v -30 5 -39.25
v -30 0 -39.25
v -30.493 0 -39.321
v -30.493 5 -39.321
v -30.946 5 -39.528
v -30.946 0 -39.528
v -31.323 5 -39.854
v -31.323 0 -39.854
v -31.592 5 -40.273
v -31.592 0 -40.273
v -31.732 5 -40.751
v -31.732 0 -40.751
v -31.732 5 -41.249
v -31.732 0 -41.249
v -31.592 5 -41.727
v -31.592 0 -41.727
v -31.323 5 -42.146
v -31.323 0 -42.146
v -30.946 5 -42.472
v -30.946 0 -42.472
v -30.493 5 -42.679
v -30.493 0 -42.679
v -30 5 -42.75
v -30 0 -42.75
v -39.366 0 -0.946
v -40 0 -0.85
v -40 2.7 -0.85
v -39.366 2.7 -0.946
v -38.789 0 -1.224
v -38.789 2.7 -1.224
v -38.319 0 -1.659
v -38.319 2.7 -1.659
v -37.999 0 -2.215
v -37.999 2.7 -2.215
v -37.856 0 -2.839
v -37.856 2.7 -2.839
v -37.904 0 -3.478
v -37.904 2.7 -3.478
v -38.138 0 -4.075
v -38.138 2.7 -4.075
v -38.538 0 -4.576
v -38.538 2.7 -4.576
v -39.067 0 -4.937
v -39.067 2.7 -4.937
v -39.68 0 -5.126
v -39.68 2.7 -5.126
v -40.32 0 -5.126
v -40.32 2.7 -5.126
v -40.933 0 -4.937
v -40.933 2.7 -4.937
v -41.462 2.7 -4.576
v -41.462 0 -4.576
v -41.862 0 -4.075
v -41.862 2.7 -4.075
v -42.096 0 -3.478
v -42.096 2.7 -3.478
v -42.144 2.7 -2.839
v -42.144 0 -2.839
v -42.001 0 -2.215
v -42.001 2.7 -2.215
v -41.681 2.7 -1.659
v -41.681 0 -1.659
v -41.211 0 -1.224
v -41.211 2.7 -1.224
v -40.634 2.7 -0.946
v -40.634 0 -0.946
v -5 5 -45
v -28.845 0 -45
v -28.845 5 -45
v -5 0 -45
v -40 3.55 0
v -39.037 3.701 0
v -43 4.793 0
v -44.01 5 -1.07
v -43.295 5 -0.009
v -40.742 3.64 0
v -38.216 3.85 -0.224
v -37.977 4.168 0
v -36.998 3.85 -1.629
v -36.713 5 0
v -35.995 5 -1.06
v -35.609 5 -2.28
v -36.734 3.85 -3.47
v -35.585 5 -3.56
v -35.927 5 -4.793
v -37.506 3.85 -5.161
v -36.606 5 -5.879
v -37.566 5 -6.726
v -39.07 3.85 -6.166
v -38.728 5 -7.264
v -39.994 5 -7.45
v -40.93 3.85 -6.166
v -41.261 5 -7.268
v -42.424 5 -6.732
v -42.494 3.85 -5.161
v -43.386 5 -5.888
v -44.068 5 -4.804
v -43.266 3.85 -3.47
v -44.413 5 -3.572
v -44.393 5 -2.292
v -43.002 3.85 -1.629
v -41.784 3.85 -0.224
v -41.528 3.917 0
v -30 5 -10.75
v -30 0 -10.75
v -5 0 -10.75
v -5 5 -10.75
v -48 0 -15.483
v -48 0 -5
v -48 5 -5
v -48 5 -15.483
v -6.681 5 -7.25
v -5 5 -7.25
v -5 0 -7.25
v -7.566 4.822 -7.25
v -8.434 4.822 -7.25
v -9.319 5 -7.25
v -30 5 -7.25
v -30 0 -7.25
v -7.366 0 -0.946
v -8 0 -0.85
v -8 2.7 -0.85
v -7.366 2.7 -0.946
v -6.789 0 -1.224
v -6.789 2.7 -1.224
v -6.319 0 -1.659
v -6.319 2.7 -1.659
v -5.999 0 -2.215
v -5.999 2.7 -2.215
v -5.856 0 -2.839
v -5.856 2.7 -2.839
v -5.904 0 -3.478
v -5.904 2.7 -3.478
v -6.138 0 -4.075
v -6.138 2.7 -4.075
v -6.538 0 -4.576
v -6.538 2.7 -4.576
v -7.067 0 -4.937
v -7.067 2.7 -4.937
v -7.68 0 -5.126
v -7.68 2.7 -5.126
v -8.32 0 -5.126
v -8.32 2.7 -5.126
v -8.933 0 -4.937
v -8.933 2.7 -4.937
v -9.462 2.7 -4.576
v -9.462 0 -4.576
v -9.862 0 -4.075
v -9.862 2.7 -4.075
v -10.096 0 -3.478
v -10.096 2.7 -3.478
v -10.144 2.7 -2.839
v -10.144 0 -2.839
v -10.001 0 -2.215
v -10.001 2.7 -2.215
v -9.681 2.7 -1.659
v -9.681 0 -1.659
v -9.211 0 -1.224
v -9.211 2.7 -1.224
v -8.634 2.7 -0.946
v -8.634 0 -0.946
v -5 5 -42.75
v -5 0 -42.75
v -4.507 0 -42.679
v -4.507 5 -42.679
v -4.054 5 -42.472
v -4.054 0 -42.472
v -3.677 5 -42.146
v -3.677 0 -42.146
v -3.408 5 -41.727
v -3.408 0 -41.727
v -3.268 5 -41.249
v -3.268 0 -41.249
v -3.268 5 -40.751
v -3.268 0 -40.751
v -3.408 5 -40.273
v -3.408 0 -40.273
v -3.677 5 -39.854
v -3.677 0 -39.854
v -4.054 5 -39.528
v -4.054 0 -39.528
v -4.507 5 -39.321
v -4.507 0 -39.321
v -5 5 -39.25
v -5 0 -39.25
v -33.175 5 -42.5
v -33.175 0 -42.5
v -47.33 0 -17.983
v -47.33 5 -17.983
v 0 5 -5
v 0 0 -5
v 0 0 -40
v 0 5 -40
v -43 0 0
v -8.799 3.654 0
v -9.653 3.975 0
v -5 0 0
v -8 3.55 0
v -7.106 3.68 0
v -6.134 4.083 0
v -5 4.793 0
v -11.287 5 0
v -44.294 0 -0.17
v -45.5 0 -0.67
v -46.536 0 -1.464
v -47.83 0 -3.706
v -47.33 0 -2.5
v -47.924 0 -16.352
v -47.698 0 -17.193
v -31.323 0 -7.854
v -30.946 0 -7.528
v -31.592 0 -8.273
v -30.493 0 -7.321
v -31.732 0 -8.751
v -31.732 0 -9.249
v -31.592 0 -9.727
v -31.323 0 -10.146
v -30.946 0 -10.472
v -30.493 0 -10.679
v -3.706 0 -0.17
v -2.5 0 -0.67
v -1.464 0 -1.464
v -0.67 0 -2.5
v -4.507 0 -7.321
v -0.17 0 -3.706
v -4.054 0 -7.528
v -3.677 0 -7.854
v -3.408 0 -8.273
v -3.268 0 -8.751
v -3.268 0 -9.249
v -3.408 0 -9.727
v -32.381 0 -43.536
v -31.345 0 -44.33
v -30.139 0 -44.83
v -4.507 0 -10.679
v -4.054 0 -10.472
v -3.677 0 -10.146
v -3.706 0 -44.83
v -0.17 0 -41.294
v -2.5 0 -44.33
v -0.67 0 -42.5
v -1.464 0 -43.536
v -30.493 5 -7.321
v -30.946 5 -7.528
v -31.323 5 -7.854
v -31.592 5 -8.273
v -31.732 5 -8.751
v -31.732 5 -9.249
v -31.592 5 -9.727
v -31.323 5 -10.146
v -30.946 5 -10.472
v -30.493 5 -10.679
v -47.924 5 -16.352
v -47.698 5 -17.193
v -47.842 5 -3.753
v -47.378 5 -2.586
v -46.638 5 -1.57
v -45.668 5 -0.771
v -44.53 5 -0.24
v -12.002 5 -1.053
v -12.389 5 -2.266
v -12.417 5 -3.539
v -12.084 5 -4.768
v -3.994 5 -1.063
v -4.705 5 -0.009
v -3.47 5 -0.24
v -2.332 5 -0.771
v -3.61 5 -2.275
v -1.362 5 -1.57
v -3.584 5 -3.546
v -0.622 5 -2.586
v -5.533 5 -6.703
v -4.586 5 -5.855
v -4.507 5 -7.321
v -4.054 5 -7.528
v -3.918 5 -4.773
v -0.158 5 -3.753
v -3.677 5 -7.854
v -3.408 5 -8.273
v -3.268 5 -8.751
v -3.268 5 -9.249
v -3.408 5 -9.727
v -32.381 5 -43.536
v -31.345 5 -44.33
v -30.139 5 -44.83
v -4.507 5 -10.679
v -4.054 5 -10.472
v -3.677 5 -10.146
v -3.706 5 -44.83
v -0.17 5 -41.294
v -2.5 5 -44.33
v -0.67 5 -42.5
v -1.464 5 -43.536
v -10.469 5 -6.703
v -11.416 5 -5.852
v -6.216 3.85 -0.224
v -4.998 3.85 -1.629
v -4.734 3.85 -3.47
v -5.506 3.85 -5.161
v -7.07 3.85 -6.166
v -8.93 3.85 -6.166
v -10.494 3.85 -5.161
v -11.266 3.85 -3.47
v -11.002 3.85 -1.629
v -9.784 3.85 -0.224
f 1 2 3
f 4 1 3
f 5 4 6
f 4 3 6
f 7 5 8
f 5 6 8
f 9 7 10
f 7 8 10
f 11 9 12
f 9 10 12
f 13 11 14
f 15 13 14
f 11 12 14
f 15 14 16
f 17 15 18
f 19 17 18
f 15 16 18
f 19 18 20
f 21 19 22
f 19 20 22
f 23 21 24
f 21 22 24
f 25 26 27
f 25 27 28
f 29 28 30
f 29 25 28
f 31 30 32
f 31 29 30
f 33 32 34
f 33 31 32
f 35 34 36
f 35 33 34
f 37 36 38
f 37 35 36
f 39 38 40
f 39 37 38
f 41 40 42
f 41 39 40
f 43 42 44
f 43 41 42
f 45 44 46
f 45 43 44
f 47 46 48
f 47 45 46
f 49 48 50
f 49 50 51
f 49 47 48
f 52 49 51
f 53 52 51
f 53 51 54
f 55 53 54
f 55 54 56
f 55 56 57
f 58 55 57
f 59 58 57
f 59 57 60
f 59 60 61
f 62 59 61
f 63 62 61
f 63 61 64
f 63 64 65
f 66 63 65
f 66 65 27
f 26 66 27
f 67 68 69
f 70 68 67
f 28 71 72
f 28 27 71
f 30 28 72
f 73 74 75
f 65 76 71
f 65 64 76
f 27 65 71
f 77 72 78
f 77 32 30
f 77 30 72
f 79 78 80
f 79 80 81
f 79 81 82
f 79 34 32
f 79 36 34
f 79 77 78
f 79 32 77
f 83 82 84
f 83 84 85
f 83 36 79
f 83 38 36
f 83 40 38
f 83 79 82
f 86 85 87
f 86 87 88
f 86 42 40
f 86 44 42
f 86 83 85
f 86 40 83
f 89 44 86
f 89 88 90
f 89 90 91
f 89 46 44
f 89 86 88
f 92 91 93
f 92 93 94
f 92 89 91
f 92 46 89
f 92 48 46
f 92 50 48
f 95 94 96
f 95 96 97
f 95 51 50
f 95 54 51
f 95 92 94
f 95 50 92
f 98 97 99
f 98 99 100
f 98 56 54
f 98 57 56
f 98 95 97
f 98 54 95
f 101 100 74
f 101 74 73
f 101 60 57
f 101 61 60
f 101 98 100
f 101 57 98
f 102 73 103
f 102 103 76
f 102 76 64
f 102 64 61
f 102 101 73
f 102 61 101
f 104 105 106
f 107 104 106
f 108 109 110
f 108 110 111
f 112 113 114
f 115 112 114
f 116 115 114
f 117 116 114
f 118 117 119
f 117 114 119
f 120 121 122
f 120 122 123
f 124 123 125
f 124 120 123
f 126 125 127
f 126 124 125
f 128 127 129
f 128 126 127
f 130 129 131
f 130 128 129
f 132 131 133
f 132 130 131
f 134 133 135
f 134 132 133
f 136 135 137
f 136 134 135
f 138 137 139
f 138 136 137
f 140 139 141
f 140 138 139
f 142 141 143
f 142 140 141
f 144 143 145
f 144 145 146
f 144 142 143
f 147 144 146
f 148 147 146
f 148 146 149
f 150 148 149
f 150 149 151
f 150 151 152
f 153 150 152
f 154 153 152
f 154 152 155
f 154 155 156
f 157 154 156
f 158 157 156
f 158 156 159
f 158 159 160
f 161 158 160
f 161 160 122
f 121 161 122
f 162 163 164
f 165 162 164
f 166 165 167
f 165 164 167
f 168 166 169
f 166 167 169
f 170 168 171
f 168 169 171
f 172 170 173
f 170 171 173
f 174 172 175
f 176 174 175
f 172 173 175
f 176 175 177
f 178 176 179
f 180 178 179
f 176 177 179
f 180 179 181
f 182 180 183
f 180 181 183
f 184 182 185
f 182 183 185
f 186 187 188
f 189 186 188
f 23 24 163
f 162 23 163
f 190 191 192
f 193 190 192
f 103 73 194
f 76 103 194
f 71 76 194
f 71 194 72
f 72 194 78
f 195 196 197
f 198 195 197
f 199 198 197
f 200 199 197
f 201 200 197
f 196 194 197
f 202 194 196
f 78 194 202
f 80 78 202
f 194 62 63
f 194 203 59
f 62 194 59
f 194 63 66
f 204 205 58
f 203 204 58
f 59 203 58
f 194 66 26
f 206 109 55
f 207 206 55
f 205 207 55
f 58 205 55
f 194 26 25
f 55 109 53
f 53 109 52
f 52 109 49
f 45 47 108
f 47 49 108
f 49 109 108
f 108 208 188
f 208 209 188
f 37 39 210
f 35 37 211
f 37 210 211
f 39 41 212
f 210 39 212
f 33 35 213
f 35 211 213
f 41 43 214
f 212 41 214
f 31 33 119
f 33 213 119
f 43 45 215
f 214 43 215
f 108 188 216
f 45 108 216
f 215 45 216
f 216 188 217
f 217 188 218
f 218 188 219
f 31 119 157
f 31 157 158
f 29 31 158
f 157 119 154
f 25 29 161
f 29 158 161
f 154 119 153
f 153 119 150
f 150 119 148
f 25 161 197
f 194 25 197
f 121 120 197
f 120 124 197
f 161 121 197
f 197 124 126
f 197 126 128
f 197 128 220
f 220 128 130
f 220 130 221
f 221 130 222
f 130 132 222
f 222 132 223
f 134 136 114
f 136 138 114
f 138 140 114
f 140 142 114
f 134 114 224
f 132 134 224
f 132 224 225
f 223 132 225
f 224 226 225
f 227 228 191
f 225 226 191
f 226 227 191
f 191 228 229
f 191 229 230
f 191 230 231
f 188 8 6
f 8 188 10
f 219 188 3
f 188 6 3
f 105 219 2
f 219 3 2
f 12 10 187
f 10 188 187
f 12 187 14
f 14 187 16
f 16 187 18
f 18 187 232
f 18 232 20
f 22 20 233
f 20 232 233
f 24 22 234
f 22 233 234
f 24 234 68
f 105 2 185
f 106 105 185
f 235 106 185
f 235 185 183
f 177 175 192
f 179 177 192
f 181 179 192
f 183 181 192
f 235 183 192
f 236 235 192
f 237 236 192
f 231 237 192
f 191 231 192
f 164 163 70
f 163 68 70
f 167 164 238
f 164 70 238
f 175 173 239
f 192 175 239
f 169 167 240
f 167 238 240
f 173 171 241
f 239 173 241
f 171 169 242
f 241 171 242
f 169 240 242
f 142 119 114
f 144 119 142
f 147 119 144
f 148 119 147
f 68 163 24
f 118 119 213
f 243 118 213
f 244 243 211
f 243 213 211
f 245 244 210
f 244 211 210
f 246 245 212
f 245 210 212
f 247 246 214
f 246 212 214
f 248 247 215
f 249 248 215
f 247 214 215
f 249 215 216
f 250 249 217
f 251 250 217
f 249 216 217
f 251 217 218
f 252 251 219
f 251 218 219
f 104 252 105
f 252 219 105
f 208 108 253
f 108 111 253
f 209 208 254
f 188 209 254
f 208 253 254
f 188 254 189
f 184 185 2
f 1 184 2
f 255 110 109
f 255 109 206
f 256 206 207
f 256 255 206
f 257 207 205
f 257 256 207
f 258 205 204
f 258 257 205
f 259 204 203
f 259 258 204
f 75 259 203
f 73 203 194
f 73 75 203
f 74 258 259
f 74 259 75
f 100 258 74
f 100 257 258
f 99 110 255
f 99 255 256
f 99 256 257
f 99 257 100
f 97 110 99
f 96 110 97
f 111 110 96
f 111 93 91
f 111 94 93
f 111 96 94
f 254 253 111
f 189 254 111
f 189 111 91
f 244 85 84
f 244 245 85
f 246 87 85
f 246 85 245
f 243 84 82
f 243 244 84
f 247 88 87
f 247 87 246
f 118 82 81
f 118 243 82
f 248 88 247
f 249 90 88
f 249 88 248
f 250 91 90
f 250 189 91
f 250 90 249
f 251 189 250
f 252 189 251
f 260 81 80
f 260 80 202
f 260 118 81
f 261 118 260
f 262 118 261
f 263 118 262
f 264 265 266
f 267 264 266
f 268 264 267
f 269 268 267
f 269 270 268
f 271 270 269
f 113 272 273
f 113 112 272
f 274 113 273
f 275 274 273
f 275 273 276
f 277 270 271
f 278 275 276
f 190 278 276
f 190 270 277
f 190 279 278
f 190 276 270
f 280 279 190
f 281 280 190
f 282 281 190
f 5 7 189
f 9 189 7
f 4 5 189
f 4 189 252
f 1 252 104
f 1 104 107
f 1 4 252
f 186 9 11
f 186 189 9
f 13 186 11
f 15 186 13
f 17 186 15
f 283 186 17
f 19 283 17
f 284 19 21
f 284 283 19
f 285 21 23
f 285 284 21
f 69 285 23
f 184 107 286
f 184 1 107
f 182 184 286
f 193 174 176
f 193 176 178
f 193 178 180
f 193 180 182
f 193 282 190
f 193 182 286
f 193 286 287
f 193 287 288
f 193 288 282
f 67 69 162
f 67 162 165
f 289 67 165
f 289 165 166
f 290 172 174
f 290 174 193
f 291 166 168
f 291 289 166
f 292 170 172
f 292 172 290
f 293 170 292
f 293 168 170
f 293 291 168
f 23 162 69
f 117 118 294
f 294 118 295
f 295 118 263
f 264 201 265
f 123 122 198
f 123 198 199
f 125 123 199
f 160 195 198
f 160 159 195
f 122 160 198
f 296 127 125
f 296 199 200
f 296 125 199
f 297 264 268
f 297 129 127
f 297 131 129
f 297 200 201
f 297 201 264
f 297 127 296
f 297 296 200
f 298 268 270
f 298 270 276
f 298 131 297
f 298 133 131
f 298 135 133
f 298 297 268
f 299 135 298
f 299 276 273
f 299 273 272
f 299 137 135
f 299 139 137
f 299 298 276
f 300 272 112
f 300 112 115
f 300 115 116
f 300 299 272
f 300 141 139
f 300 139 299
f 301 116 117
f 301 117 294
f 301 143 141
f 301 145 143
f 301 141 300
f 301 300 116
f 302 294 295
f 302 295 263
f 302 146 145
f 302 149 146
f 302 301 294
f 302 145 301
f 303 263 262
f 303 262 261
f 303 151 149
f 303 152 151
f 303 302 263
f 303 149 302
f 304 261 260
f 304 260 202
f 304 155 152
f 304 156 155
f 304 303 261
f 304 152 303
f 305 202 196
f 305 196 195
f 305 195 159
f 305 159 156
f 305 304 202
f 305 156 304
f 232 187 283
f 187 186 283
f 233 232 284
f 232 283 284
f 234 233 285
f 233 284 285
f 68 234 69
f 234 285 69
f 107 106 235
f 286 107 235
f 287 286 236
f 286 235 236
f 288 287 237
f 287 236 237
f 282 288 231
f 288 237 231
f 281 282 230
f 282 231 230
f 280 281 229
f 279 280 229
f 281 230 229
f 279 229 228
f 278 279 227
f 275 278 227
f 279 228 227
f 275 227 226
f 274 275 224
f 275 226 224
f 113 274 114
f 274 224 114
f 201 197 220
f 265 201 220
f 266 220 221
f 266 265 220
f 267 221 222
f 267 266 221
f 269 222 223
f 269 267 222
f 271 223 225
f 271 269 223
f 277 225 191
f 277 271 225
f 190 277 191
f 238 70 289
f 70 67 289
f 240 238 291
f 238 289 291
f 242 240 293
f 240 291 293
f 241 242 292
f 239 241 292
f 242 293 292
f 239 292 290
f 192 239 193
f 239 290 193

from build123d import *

# Parameters (mm, degrees)
SKETCH1_W               = 48
SKETCH1_H               = 45
SKETCH1_R               = 2.15
BOSS_EXTRUDE1_DEPTH     = 5
CUT_EXTRUDE1_DEPTH      = 66.984846745
CUT_EXTRUDE1_DEPTH_BACK = 66.984846745
FILLET1_R               = 5
CHAMFER1_SIZE           = 2.3


with BuildPart() as part:
    # Sketch1 → Boss-Extrude1 (new body)
    with BuildSketch(Plane(origin=(0, 0, 0), x_dir=(1, 0, 0), z_dir=(0, 1, 0))):
        with Locations((-24, 22.5)):
            Rectangle(SKETCH1_W, SKETCH1_H)
        with Locations(Location((-40, 3, 0), (0, 0, 270))):
            Circle(SKETCH1_R, mode=Mode.SUBTRACT)
        with Locations(Location((-8, 3, 0), (0, 0, 270))):
            Circle(SKETCH1_R, mode=Mode.SUBTRACT)
        with BuildLine():
            Line((-30, 10.75), (-5, 10.75))
            ThreePointArc((-5, 10.75), (-3.25, 9), (-5, 7.25))
            Line((-5, 7.25), (-30, 7.25))
            ThreePointArc((-30, 7.25), (-31.75, 9), (-30, 10.75))
        make_face(mode=Mode.SUBTRACT)
        with BuildLine():
            Line((-30, 42.75), (-5, 42.75))
            ThreePointArc((-5, 42.75), (-3.25, 41), (-5, 39.25))
            Line((-5, 39.25), (-30, 39.25))
            ThreePointArc((-30, 39.25), (-31.75, 41), (-30, 42.75))
        make_face(mode=Mode.SUBTRACT)
    extrude(amount=BOSS_EXTRUDE1_DEPTH)

    # Sketch2 → Cut-Extrude1 (cut, two sides: drawn at the far end of the back side and taken through both)
    with BuildSketch(Plane(origin=(0, 5, 0), x_dir=(1, 0, 0), z_dir=(0, 1, 0)).offset(-CUT_EXTRUDE1_DEPTH_BACK)):
        Polygon((-31.732050808, 45), (-48, 16.823085464), (-48, 45), align=None)
    extrude(amount=CUT_EXTRUDE1_DEPTH + CUT_EXTRUDE1_DEPTH_BACK, mode=Mode.SUBTRACT)

    # Fillet1
    fillet1_edges = [part.edges().sort_by_distance(p)[0] for p in [
        (-31.732050808, 2.5, -45),
        (-48, 2.5, -16.823085464),
        (0, 2.5, 0),
        (-48, 2.5, 0),
        (0, 2.5, -45),
    ]]
    fillet(fillet1_edges, radius=FILLET1_R)

    # Chamfer1
    # the kernel refuses this chamfer: 2.3 mm, written as the material it takes off along each edge
    with BuildSketch(Plane(origin=(-40, 5, -3), x_dir=(0, 0, 1), z_dir=(-1, 0, 0))) as chamfer1_piece_1:
        Polygon((2.15 + CHAMFER1_SIZE, 0), (2.15, -CHAMFER1_SIZE), (2.15, 0), align=None)
    revolve(axis=Axis((-40, 5, -3), (0, 1, 0)), mode=Mode.SUBTRACT)
    with BuildSketch(Plane(origin=(-8, 5, -3), x_dir=(0, 0, 1), z_dir=(-1, 0, 0))) as chamfer1_piece_2:
        Polygon((2.15 + CHAMFER1_SIZE, 0), (2.15, -CHAMFER1_SIZE), (2.15, 0), align=None)
    revolve(axis=Axis((-8, 5, -3), (0, 1, 0)), mode=Mode.SUBTRACT)


solid = part.part
